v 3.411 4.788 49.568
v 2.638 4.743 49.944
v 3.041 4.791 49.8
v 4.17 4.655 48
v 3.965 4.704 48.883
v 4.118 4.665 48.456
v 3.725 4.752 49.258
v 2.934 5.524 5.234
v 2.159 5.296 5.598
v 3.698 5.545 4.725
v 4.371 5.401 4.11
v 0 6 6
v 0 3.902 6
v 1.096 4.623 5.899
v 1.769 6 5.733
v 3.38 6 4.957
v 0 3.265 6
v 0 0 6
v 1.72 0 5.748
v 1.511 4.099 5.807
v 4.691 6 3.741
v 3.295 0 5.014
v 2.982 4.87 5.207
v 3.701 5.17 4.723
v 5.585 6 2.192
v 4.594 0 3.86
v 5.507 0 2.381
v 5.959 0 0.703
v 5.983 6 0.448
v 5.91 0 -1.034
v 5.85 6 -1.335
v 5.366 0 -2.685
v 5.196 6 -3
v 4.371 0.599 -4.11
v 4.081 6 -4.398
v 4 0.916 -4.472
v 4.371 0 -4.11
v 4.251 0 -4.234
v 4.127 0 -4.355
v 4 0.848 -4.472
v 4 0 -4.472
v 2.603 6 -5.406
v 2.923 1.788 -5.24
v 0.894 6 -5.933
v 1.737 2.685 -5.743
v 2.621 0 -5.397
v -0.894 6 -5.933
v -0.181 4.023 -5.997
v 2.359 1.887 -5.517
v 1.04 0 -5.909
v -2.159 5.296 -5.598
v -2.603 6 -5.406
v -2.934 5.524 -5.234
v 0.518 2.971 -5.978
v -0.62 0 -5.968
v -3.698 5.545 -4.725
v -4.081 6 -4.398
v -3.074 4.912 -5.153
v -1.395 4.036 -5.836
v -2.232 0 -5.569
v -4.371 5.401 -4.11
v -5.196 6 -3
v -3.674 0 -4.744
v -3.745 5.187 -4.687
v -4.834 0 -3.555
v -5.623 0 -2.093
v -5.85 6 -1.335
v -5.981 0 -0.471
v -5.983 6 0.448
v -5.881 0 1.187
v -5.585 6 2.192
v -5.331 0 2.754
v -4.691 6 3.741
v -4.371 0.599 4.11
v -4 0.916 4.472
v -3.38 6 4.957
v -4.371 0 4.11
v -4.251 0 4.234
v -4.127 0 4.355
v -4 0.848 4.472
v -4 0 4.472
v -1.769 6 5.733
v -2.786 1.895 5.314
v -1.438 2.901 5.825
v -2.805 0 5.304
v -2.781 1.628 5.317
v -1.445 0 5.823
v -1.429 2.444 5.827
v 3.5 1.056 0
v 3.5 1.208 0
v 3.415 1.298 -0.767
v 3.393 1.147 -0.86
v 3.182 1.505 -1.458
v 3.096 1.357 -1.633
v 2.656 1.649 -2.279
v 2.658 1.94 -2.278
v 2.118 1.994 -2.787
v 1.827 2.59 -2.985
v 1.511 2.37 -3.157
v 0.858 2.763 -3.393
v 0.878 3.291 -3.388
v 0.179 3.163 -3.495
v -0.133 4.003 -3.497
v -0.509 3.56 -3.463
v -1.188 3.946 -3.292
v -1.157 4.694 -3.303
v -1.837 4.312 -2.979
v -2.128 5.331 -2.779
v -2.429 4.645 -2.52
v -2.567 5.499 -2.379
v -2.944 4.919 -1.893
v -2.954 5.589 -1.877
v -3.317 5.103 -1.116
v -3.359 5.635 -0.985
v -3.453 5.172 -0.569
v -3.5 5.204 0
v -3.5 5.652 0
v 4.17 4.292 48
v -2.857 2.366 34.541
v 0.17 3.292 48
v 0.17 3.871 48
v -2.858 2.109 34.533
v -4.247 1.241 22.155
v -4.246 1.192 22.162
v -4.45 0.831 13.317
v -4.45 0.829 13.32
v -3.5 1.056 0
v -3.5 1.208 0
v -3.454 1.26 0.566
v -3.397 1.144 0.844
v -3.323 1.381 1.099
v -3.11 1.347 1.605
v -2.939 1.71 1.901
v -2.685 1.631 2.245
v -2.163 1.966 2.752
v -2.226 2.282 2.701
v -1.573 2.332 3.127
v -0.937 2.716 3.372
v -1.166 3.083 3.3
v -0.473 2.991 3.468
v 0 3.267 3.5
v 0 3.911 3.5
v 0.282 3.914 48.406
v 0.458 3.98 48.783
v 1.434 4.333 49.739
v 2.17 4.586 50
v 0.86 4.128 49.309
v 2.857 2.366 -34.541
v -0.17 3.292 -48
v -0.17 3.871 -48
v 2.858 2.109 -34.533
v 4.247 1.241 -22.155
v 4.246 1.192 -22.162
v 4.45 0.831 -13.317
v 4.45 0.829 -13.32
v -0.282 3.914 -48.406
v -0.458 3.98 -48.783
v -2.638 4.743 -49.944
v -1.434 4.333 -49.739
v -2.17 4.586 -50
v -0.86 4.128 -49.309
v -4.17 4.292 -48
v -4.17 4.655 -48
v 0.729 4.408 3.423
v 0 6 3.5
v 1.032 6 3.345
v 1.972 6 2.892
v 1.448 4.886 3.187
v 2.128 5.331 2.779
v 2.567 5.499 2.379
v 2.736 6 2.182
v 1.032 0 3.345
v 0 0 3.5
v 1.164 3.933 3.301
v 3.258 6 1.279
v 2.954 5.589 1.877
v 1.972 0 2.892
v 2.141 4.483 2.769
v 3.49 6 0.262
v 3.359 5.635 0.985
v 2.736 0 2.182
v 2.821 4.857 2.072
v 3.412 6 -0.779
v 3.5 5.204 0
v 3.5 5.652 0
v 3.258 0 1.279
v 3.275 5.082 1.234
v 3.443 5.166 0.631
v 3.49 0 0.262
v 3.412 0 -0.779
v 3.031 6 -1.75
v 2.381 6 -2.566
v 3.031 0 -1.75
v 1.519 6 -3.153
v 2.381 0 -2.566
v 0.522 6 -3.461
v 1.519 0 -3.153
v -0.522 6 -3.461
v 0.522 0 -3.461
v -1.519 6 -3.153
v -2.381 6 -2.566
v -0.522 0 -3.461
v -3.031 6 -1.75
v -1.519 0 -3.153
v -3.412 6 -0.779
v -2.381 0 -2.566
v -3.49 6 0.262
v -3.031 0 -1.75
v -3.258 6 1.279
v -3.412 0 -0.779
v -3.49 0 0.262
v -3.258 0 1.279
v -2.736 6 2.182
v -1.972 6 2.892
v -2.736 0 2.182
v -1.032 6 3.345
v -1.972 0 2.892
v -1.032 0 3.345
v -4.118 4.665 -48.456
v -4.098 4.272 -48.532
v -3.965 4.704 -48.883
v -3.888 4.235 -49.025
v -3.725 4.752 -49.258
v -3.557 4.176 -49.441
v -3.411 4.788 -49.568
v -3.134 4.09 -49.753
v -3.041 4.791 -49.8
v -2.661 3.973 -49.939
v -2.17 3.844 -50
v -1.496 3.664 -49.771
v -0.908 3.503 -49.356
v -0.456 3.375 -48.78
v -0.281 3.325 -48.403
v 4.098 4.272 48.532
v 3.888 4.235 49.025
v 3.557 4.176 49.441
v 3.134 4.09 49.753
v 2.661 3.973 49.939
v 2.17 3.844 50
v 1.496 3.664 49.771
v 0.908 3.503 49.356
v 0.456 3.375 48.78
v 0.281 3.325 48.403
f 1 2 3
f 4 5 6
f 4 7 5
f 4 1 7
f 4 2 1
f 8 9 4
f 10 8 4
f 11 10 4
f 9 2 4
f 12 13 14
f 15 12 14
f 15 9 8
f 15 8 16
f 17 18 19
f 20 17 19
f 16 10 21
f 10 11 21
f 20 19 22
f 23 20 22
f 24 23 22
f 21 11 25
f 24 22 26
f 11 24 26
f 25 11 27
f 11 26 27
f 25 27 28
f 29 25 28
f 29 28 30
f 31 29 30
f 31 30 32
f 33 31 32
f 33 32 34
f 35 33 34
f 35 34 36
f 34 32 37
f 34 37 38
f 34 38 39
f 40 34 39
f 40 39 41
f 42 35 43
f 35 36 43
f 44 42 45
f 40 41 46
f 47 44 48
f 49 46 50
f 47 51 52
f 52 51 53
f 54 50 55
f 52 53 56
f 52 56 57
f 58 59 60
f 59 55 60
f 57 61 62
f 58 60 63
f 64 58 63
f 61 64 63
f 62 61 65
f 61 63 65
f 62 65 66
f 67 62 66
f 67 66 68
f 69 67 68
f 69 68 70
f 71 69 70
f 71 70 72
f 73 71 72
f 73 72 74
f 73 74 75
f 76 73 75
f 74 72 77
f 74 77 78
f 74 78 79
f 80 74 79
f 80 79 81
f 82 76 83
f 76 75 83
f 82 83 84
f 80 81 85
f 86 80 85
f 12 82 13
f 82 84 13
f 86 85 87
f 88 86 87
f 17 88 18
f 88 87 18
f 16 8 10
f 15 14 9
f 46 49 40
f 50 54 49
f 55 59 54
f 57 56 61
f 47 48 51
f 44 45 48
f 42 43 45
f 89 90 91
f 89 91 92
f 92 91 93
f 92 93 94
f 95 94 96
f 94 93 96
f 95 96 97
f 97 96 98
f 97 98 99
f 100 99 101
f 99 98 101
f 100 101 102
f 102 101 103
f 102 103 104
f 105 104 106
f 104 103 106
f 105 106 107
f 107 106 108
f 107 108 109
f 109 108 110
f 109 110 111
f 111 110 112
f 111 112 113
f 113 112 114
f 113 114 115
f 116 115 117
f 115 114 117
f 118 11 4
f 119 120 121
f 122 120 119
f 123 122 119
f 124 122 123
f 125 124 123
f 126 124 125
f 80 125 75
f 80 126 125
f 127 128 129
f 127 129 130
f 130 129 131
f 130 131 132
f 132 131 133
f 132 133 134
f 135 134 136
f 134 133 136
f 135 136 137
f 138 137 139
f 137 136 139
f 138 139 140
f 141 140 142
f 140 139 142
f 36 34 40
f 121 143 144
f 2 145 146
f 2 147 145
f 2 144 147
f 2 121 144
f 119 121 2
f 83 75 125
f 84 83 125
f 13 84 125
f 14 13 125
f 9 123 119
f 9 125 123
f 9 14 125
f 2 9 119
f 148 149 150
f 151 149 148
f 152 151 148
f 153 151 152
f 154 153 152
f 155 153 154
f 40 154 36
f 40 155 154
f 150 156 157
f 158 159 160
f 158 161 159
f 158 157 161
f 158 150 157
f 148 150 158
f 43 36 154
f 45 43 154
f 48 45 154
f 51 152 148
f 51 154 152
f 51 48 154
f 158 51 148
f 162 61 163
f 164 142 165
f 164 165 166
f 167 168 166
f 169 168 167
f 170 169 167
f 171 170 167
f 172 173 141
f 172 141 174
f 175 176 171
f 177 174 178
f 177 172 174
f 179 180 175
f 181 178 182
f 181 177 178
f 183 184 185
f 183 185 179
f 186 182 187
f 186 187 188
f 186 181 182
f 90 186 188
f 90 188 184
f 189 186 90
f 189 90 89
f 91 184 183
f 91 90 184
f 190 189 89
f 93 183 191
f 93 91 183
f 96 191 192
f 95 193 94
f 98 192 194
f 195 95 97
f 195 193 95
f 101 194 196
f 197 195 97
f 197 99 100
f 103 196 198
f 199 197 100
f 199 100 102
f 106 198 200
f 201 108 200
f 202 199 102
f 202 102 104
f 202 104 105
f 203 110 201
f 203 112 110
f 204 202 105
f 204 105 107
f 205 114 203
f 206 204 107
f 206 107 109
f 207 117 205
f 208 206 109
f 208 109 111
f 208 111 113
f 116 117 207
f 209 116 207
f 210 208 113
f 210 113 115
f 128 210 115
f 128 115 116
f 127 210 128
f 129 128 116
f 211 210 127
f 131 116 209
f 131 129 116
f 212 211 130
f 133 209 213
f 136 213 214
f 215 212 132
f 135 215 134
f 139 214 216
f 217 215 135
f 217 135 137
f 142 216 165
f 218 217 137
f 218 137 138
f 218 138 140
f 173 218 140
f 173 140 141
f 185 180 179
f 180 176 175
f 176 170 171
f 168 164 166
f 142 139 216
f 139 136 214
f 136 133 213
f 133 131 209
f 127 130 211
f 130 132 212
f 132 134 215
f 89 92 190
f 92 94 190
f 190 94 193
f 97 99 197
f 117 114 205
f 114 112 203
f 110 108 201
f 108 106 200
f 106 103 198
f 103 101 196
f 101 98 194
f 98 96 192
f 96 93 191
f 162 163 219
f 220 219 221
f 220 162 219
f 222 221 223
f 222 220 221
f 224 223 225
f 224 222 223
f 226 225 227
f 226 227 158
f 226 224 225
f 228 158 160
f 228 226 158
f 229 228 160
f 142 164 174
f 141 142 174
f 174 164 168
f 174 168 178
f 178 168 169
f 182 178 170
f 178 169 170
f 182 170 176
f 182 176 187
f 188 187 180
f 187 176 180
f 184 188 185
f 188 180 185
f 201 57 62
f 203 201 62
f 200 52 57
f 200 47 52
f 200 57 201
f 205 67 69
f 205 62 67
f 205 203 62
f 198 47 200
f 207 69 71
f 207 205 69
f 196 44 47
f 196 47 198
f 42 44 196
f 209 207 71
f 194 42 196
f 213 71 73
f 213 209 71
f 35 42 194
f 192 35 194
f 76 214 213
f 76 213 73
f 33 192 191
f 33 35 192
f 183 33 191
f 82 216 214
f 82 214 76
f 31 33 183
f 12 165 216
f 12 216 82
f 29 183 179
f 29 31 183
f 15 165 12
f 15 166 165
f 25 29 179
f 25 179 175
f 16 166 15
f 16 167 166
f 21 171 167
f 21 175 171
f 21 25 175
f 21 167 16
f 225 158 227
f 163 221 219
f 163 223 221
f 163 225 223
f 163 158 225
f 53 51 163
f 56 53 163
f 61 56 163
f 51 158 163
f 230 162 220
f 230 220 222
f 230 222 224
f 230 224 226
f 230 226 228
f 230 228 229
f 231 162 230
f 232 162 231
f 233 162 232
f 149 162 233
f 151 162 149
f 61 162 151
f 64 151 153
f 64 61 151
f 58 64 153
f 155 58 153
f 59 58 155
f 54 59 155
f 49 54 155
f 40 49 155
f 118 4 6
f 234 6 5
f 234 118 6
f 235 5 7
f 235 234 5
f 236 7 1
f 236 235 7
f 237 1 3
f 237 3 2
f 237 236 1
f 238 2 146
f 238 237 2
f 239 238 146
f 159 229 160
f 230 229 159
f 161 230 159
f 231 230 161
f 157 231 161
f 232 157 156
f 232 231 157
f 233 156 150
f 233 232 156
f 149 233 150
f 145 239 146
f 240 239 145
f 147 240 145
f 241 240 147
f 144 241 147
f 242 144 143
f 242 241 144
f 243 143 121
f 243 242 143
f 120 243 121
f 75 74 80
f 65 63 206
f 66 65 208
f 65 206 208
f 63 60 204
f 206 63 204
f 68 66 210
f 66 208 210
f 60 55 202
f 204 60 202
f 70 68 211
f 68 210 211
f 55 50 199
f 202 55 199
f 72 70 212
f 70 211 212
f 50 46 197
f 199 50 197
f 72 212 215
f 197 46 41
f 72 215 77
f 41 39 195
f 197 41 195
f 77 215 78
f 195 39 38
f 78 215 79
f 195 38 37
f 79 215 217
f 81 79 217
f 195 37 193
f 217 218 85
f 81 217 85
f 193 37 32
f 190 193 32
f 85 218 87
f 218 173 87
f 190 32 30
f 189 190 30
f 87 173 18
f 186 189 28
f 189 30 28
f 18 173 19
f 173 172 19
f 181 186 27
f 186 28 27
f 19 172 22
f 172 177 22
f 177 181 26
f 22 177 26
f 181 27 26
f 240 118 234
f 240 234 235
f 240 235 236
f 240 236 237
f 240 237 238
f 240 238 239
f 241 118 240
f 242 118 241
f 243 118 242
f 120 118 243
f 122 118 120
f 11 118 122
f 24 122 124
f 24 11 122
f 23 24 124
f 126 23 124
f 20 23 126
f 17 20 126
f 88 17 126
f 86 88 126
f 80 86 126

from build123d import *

# Parameters (mm, degrees)
SKETCH_1_R               = 6
SKETCH_1_R_2             = 3.5
EXTRUDE_1_DEPTH          = 6
CUT_EXTRUDE_1_DEPTH      = 51.714889455
PATTERN_CIRCULAR_1_COUNT = 2
SKETCH_6_R               = 3.500000001
CUT_EXTRUDE_2_DEPTH      = 51.714889443


with BuildPart() as part:
    # 草图1 → 凸台-拉伸1 (new body)
    with BuildSketch(Plane(origin=(0, 0, 0), x_dir=(1, 0, 0), z_dir=(0, 1, 0))):
        with Locations(Location((0, 0, 0), (0, 0, 270))):
            Circle(SKETCH_1_R)
        with Locations(Location((0, 0, 0), (0, 0, 270))):
            Circle(SKETCH_1_R_2, mode=Mode.SUBTRACT)
    extrude(amount=EXTRUDE_1_DEPTH)

    # 放样1: read off the stored shape, not the designer's step
    # 放样1: loft between two sections, ruled curve by curve
    loft_1_from = [
        Edge.make_bspline([(4.829629131, 4.294095226, 50), (4.661491838, 4.287956363, 50), (4.325526719, 4.26719033, 50), (3.823791731, 4.210654383, 50), (3.325552775, 4.128877425, 50), (2.996563694, 4.057669381, 50), (2.187142745, 3.850933665, 50), (0.89862524, 3.503994998, 50), (-1.023348969, 2.94500881, 50), (-2.933748014, 2.347669617, 50), (-4.199124361, 1.92403297, 50), (-4.829629131, 1.705904774, 50)], [0, 0, 0, 0, 0.050348748, 0.100697496, 0.151046245, 0.201394993, 0.201394993, 0.401046245, 0.600697496, 0.800348748, 1, 1, 1, 1], 3),
        Edge.make_bspline([(2.638958434, 4.742382962, 50), (3.399643135, 4.880839784, 50), (4.184480539, 4.72023464, 50), (4.829629131, 4.294095226, 50)], [0, 0, 0, 0, 1, 1, 1, 1], 3),
        Edge.make_bspline([(-4.829629131, 1.705904774, 50), (-2.410341267, 2.884687308, 50), (0.08347511, 3.898589732, 50), (2.638958434, 4.742382962, 50)], [0, 0, 0, 0, 1, 1, 1, 1], 3),
    ]
    loft_1_to = [
        Edge.make_bspline([(4.330127019, 5.5, 0), (4.16930772, 5.450553181, 0), (3.850164979, 5.343540561, 0), (3.380158776, 5.15907246, 0), (2.920062334, 4.951128253, 0), (2.620713283, 4.797197925, 0), (1.892379824, 4.388013, 0), (0.737561824, 3.719403112, 0), (-0.974246431, 2.682020387, 0), (-2.664947447, 1.610587376, 0), (-3.777561909, 0.873882301, 0), (-4.330127019, 0.5, 0)], [0, 0, 0, 0, 0.050348748, 0.100697496, 0.151046245, 0.201394993, 0.201394993, 0.401046245, 0.600697496, 0.800348748, 1, 1, 1, 1], 3),
        Edge.make_bspline([(2.098076211, 5.366025404, 0), (2.797005947, 5.696644113, 0), (3.596668336, 5.744642324, 0), (4.330127019, 5.5, 0)], [0, 0, 0, 0, 1, 1, 1, 1], 3),
        Edge.make_bspline([(-4.330127019, 0.5, 0), (-2.298365759, 2.264774268, 0), (-0.151941372, 3.889575977, 0), (2.098076211, 5.366025404, 0)], [0, 0, 0, 0, 1, 1, 1, 1], 3),
    ]
    loft_1 = Solid(Shell([*[Face.make_surface_from_curves(loft_1_from[k], loft_1_to[k]) for k in range(3)], Face(Wire(loft_1_from)), Face(Wire(loft_1_to))]))
    add(loft_1)

    # Loft 1 2: loft between two sections, ruled curve by curve
    loft_1_2_from = [
        Edge.make_bspline([(4.829629131, 4.294095226, 50), (4.661491838, 4.287956363, 50), (4.325526719, 4.26719033, 50), (3.823791731, 4.210654383, 50), (3.325552775, 4.128877425, 50), (2.996563694, 4.057669381, 50), (2.187142745, 3.850933665, 50), (0.89862524, 3.503994998, 50), (-1.023348969, 2.94500881, 50), (-2.933748014, 2.347669617, 50), (-4.199124361, 1.92403297, 50), (-4.829629131, 1.705904774, 50)], [0, 0, 0, 0, 0.050348748, 0.100697496, 0.151046245, 0.201394993, 0.201394993, 0.401046245, 0.600697496, 0.800348748, 1, 1, 1, 1], 3),
        Edge.make_bspline([(-4.829629131, 1.705904774, 50), (-2.410341267, 2.884687308, 50), (0.08347511, 3.898589732, 50), (2.638958434, 4.742382962, 50)], [0, 0, 0, 0, 1, 1, 1, 1], 3),
        Edge.make_bspline([(2.638958434, 4.742382962, 50), (3.399643135, 4.880839784, 50), (4.184480539, 4.72023464, 50), (4.829629131, 4.294095226, 50)], [0, 0, 0, 0, 1, 1, 1, 1], 3),
    ]
    loft_1_2_to = [
        Edge.make_bspline([(4.330127019, 5.5, 0), (4.16930772, 5.450553181, 0), (3.850164979, 5.343540561, 0), (3.380158776, 5.15907246, 0), (2.920062334, 4.951128253, 0), (2.620713283, 4.797197925, 0), (1.892379824, 4.388013, 0), (0.737561824, 3.719403112, 0), (-0.974246431, 2.682020387, 0), (-2.664947447, 1.610587376, 0), (-3.777561909, 0.873882301, 0), (-4.330127019, 0.5, 0)], [0, 0, 0, 0, 0.050348748, 0.100697496, 0.151046245, 0.201394993, 0.201394993, 0.401046245, 0.600697496, 0.800348748, 1, 1, 1, 1], 3),
        Edge.make_bspline([(-4.330127019, 0.5, 0), (-2.298365759, 2.264774268, 0), (-0.151941372, 3.889575977, 0), (2.098076211, 5.366025404, 0)], [0, 0, 0, 0, 1, 1, 1, 1], 3),
        Edge.make_bspline([(2.098076211, 5.366025404, 0), (2.797005947, 5.696644113, 0), (3.596668336, 5.744642324, 0), (4.330127019, 5.5, 0)], [0, 0, 0, 0, 1, 1, 1, 1], 3),
    ]
    loft_1_2 = Solid(Shell([*[Face.make_surface_from_curves(loft_1_2_from[k], loft_1_2_to[k]) for k in range(3)], Face(Wire(loft_1_2_from)), Face(Wire(loft_1_2_to))]))
    add(loft_1_2)

    # 草图5 → 切除-拉伸1 (cut, through all)
    with BuildSketch(Plane(origin=(0, 0, 0), x_dir=(1, 0, 0), z_dir=(0, 1, 0))):
        with BuildLine():
            Line((-4.371186853, -4.110076094), (-6.947319176, -4.110076094))
            Line((-6.947319176, -4.110076094), (-6.947319176, -57.52702734))
            Line((-6.947319176, -57.52702734), (10.303651078, -57.52702734))
            Line((10.303651078, -57.52702734), (10.303651078, -4.110076094))
            Line((10.303651078, -4.110076094), (4.371186853, -4.110076094))
            ThreePointArc((4.371186853, -4.110076094), (4.391179084, -26.055588932), (4.170370869, -48))
            ThreePointArc((4.170370869, -48), (3.584584431, -49.414213562), (2.170370869, -50))
            ThreePointArc((2.170370869, -50), (0.860341889, -49.310028979), (0.170370869, -48))
            ThreePointArc((0.170370869, -48), (-3.914204719, -26.427627996), (-4, -4.472135955))
            ThreePointArc((-4, -4.472135955), (-4.189506435, -4.295117674), (-4.371186853, -4.110076094))
        make_face()
    cut_extrude_1 = extrude(amount=CUT_EXTRUDE_1_DEPTH, mode=Mode.SUBTRACT)

    # 阵列(圆周)1: 放样1, Loft 1 2, 切除-拉伸1 ×2 about axis
    pattern_circular_1_axis = Axis((0, 6, 0), (0, -1, 0))
    add([loft_1.rotate(pattern_circular_1_axis, i * 360 / PATTERN_CIRCULAR_1_COUNT) for i in range(1, PATTERN_CIRCULAR_1_COUNT)])
    add([loft_1_2.rotate(pattern_circular_1_axis, i * 360 / PATTERN_CIRCULAR_1_COUNT) for i in range(1, PATTERN_CIRCULAR_1_COUNT)])
    add([cut_extrude_1.rotate(pattern_circular_1_axis, i * 360 / PATTERN_CIRCULAR_1_COUNT) for i in range(1, PATTERN_CIRCULAR_1_COUNT)], mode=Mode.SUBTRACT)

    # 草图6 → 切除-拉伸2 (cut, through all)
    with BuildSketch(Plane(origin=(0, 6, 0), x_dir=(1, 0, 0), z_dir=(0, 1, 0))):
        with Locations(Location((1e-09, 0, 0), (0, 0, 269.999999987))):
            Circle(SKETCH_6_R)
    extrude(amount=-CUT_EXTRUDE_2_DEPTH, mode=Mode.SUBTRACT)


solid = part.part
